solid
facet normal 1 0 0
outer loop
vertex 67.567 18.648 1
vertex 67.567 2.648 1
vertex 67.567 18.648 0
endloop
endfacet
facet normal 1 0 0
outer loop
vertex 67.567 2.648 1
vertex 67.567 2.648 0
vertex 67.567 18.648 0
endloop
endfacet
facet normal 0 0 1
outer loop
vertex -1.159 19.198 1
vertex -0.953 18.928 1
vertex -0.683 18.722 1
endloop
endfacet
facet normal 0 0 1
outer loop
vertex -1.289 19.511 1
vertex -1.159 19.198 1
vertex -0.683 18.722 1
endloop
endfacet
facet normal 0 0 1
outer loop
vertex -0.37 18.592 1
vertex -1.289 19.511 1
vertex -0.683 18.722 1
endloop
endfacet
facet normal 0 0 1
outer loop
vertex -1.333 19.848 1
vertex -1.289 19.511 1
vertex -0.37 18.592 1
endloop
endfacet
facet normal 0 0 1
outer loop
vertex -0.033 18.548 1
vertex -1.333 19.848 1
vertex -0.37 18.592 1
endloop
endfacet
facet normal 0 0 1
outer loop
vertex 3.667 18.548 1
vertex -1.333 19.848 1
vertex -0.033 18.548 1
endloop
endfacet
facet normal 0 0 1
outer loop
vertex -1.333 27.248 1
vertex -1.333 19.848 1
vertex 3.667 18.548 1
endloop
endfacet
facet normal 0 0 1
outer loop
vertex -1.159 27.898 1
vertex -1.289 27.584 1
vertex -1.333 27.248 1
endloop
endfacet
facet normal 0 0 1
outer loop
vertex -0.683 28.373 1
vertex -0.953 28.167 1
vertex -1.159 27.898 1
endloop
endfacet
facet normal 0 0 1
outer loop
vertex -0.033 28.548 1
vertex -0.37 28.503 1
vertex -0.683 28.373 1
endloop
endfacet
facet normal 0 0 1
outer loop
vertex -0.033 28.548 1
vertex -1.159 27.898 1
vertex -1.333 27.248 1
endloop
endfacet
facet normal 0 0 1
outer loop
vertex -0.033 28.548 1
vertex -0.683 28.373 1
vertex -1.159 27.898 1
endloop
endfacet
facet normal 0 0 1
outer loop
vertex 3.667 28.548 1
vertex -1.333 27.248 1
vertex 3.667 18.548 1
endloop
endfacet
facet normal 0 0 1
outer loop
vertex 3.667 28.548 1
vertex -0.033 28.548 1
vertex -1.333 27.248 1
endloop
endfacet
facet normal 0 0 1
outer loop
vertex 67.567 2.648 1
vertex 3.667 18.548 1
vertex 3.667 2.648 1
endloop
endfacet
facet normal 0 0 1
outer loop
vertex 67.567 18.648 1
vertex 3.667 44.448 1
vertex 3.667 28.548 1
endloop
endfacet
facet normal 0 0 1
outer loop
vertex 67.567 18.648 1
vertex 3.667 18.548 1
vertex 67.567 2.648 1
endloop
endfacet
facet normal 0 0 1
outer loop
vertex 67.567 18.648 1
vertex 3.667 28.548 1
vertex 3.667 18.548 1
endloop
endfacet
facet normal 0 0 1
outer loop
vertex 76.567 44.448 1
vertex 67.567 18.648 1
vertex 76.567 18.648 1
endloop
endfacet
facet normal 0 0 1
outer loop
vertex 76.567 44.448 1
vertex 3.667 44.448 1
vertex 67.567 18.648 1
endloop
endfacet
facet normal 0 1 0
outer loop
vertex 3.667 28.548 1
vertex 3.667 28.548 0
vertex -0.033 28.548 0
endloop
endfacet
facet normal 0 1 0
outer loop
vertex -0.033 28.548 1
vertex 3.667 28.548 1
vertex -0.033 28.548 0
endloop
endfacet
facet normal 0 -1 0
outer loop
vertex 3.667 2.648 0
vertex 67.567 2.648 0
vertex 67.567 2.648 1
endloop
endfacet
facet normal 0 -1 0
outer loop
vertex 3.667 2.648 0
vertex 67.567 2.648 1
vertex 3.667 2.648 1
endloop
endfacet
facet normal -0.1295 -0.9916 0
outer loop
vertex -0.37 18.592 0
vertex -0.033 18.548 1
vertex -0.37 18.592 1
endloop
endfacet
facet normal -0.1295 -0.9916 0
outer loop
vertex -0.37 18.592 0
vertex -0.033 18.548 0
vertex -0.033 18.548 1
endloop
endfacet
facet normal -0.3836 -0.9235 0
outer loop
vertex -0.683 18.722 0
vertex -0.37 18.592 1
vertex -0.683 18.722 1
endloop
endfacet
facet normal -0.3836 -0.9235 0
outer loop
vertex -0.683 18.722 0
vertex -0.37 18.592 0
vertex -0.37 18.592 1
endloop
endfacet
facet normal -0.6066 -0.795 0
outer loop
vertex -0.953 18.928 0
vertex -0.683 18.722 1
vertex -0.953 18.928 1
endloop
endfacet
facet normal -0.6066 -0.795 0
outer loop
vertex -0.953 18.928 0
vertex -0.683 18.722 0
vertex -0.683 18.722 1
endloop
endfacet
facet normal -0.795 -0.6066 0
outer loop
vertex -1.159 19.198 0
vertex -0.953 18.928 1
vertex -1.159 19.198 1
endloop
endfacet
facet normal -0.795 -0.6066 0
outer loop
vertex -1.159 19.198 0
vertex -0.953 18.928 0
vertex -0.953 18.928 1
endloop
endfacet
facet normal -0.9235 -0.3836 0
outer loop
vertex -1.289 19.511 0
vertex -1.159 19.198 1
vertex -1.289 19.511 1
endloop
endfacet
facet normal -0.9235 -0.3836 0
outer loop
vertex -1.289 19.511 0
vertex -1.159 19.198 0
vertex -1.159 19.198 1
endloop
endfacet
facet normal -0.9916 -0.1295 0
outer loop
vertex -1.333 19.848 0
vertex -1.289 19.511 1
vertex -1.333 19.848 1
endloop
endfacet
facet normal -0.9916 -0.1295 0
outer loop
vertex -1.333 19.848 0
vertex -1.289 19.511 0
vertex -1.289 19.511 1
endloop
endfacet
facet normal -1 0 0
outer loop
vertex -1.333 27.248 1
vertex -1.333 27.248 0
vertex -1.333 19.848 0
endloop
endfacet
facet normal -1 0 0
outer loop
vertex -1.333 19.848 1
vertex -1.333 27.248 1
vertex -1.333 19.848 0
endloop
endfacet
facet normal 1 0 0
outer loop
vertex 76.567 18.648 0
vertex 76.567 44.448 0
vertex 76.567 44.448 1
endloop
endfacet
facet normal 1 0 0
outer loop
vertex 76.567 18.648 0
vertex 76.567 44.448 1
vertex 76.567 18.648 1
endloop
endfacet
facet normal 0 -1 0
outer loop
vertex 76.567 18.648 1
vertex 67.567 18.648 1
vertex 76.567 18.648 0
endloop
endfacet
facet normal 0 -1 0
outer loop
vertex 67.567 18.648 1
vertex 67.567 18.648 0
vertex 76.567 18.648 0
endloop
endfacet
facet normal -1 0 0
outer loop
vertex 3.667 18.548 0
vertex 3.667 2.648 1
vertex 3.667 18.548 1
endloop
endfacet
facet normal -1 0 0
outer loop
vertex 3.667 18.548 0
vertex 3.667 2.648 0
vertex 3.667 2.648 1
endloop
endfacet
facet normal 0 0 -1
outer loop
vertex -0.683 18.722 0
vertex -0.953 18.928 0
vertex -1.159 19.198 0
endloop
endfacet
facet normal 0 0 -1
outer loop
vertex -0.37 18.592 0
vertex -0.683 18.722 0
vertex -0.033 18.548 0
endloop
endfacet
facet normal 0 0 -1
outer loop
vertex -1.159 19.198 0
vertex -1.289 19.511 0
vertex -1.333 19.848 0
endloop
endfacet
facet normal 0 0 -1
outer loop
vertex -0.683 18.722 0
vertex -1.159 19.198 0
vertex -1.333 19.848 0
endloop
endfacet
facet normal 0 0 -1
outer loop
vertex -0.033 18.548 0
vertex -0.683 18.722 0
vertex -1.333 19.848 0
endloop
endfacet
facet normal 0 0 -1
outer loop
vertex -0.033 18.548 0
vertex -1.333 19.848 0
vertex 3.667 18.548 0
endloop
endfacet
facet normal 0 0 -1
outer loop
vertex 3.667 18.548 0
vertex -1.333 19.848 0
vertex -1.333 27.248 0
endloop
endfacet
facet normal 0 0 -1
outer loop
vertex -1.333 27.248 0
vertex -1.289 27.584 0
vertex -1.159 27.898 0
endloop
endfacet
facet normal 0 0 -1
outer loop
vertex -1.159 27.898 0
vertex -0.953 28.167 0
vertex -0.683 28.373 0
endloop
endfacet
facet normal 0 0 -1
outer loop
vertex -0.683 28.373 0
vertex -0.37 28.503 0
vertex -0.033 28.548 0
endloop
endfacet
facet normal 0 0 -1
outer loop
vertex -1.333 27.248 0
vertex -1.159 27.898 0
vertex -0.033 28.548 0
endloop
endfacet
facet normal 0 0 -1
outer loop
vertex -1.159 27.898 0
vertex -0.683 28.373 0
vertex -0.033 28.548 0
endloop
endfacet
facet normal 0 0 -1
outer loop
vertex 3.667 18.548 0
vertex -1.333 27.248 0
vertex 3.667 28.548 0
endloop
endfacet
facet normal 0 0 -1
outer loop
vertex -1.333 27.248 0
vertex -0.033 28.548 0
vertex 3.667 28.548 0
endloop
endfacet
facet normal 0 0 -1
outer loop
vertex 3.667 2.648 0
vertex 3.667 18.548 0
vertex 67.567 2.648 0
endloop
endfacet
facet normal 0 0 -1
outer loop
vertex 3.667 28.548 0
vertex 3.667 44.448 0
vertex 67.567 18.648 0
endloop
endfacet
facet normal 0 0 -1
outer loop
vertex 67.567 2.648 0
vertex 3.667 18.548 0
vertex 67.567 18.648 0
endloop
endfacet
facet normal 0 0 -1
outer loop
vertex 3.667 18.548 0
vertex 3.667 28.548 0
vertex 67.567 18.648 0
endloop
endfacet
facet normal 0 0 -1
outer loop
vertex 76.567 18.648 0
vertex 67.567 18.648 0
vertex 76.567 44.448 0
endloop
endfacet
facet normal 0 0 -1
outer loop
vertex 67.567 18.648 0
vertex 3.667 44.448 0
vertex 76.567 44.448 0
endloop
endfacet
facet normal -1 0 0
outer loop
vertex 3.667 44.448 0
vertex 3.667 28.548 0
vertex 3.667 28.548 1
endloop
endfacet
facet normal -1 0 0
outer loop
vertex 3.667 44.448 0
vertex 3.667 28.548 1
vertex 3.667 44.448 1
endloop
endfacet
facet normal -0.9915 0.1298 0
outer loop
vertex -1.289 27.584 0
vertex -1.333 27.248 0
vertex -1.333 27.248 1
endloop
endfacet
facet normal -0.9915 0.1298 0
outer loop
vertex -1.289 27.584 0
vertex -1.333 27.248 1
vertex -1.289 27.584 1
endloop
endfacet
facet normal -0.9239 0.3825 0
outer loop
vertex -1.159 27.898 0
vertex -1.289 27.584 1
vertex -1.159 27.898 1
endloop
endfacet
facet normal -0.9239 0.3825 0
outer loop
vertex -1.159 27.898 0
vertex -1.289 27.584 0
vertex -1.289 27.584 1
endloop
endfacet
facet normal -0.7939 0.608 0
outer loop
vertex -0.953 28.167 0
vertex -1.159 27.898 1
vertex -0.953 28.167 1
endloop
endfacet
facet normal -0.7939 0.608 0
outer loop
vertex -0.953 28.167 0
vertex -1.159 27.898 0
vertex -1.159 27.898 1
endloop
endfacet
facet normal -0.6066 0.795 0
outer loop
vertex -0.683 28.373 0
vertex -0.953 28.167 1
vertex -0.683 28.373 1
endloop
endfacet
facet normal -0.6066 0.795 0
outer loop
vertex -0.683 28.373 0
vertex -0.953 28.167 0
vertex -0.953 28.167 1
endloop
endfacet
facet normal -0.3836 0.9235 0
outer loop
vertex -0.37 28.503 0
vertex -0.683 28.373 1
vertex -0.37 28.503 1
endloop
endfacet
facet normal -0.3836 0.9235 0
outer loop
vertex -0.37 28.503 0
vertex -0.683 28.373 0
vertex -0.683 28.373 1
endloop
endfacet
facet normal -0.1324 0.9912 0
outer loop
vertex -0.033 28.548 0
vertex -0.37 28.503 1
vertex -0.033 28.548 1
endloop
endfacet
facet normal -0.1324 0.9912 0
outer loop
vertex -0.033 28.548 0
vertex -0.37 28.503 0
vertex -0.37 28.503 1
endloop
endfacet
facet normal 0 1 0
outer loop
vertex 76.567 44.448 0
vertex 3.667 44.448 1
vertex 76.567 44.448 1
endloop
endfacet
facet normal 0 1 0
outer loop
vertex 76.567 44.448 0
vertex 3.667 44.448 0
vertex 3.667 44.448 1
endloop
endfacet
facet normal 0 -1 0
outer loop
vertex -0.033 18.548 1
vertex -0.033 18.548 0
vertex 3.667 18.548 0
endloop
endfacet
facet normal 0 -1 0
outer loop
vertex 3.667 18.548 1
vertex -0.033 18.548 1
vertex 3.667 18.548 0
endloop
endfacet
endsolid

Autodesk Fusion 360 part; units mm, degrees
sketch "Sketch1" plane through (0, 0, 0) normal (0, 0, 1) x (1, 0, 0)
  line L0 (3.6667, 44.4476) -> (76.5667, 44.4476)
  line L1 (76.5667, 44.4476) -> (76.5667, 2.6476)
  line L2 (76.5667, 2.6476) -> (3.6667, 2.6476)
  line L3 (3.6667, 2.6476) -> (3.6667, 44.4476)
  line L4 (3.6667, 23.5476) -> (76.5667, 23.5476) construction
  line L5 (3.6667, 28.5476) -> (-0.0333, 28.5476)
  line L6 (-1.3333, 27.2476) -> (-1.3333, 19.8476)
  line L7 (-0.0333, 18.5476) -> (3.6667, 18.5476)
  line L8 (3.6667, 18.5476) -> (3.6667, 28.5476)
  arc A0 (-0.0333, 28.5476) -> (-1.3333, 27.2476) centre (-0.0333, 27.2476) ccw
  arc A1 (-1.3333, 19.8476) -> (-0.0333, 18.5476) centre (-0.0333, 19.8476) ccw
  line L9 (76.5667, 2.6476) -> (67.5667, 2.6476)
  line L10 (67.5667, 2.6476) -> (67.5667, 18.6476)
  line L11 (67.5667, 18.6476) -> (76.5667, 18.6476)
  line L12 (76.5667, 18.6476) -> (76.5667, 2.6476)
  point P0 (-1.3333, 28.5476)
  point P1 (-1.3333, 18.5476)
  dimension "d1" = 72.9
  dimension "d2" = 41.8
  dimension "d7" = 10
  dimension "d8" = 5
  dimension "d9" = 1.3
  dimension "d10" = 16
  dimension "d11" = 9
extrude "Extrude1" add sketch "Sketch1" along normal blind 1 contours L0 L1 L2 L3 L8 L10 L11 | L3 L5 L6 L7 L8 A0 A1
